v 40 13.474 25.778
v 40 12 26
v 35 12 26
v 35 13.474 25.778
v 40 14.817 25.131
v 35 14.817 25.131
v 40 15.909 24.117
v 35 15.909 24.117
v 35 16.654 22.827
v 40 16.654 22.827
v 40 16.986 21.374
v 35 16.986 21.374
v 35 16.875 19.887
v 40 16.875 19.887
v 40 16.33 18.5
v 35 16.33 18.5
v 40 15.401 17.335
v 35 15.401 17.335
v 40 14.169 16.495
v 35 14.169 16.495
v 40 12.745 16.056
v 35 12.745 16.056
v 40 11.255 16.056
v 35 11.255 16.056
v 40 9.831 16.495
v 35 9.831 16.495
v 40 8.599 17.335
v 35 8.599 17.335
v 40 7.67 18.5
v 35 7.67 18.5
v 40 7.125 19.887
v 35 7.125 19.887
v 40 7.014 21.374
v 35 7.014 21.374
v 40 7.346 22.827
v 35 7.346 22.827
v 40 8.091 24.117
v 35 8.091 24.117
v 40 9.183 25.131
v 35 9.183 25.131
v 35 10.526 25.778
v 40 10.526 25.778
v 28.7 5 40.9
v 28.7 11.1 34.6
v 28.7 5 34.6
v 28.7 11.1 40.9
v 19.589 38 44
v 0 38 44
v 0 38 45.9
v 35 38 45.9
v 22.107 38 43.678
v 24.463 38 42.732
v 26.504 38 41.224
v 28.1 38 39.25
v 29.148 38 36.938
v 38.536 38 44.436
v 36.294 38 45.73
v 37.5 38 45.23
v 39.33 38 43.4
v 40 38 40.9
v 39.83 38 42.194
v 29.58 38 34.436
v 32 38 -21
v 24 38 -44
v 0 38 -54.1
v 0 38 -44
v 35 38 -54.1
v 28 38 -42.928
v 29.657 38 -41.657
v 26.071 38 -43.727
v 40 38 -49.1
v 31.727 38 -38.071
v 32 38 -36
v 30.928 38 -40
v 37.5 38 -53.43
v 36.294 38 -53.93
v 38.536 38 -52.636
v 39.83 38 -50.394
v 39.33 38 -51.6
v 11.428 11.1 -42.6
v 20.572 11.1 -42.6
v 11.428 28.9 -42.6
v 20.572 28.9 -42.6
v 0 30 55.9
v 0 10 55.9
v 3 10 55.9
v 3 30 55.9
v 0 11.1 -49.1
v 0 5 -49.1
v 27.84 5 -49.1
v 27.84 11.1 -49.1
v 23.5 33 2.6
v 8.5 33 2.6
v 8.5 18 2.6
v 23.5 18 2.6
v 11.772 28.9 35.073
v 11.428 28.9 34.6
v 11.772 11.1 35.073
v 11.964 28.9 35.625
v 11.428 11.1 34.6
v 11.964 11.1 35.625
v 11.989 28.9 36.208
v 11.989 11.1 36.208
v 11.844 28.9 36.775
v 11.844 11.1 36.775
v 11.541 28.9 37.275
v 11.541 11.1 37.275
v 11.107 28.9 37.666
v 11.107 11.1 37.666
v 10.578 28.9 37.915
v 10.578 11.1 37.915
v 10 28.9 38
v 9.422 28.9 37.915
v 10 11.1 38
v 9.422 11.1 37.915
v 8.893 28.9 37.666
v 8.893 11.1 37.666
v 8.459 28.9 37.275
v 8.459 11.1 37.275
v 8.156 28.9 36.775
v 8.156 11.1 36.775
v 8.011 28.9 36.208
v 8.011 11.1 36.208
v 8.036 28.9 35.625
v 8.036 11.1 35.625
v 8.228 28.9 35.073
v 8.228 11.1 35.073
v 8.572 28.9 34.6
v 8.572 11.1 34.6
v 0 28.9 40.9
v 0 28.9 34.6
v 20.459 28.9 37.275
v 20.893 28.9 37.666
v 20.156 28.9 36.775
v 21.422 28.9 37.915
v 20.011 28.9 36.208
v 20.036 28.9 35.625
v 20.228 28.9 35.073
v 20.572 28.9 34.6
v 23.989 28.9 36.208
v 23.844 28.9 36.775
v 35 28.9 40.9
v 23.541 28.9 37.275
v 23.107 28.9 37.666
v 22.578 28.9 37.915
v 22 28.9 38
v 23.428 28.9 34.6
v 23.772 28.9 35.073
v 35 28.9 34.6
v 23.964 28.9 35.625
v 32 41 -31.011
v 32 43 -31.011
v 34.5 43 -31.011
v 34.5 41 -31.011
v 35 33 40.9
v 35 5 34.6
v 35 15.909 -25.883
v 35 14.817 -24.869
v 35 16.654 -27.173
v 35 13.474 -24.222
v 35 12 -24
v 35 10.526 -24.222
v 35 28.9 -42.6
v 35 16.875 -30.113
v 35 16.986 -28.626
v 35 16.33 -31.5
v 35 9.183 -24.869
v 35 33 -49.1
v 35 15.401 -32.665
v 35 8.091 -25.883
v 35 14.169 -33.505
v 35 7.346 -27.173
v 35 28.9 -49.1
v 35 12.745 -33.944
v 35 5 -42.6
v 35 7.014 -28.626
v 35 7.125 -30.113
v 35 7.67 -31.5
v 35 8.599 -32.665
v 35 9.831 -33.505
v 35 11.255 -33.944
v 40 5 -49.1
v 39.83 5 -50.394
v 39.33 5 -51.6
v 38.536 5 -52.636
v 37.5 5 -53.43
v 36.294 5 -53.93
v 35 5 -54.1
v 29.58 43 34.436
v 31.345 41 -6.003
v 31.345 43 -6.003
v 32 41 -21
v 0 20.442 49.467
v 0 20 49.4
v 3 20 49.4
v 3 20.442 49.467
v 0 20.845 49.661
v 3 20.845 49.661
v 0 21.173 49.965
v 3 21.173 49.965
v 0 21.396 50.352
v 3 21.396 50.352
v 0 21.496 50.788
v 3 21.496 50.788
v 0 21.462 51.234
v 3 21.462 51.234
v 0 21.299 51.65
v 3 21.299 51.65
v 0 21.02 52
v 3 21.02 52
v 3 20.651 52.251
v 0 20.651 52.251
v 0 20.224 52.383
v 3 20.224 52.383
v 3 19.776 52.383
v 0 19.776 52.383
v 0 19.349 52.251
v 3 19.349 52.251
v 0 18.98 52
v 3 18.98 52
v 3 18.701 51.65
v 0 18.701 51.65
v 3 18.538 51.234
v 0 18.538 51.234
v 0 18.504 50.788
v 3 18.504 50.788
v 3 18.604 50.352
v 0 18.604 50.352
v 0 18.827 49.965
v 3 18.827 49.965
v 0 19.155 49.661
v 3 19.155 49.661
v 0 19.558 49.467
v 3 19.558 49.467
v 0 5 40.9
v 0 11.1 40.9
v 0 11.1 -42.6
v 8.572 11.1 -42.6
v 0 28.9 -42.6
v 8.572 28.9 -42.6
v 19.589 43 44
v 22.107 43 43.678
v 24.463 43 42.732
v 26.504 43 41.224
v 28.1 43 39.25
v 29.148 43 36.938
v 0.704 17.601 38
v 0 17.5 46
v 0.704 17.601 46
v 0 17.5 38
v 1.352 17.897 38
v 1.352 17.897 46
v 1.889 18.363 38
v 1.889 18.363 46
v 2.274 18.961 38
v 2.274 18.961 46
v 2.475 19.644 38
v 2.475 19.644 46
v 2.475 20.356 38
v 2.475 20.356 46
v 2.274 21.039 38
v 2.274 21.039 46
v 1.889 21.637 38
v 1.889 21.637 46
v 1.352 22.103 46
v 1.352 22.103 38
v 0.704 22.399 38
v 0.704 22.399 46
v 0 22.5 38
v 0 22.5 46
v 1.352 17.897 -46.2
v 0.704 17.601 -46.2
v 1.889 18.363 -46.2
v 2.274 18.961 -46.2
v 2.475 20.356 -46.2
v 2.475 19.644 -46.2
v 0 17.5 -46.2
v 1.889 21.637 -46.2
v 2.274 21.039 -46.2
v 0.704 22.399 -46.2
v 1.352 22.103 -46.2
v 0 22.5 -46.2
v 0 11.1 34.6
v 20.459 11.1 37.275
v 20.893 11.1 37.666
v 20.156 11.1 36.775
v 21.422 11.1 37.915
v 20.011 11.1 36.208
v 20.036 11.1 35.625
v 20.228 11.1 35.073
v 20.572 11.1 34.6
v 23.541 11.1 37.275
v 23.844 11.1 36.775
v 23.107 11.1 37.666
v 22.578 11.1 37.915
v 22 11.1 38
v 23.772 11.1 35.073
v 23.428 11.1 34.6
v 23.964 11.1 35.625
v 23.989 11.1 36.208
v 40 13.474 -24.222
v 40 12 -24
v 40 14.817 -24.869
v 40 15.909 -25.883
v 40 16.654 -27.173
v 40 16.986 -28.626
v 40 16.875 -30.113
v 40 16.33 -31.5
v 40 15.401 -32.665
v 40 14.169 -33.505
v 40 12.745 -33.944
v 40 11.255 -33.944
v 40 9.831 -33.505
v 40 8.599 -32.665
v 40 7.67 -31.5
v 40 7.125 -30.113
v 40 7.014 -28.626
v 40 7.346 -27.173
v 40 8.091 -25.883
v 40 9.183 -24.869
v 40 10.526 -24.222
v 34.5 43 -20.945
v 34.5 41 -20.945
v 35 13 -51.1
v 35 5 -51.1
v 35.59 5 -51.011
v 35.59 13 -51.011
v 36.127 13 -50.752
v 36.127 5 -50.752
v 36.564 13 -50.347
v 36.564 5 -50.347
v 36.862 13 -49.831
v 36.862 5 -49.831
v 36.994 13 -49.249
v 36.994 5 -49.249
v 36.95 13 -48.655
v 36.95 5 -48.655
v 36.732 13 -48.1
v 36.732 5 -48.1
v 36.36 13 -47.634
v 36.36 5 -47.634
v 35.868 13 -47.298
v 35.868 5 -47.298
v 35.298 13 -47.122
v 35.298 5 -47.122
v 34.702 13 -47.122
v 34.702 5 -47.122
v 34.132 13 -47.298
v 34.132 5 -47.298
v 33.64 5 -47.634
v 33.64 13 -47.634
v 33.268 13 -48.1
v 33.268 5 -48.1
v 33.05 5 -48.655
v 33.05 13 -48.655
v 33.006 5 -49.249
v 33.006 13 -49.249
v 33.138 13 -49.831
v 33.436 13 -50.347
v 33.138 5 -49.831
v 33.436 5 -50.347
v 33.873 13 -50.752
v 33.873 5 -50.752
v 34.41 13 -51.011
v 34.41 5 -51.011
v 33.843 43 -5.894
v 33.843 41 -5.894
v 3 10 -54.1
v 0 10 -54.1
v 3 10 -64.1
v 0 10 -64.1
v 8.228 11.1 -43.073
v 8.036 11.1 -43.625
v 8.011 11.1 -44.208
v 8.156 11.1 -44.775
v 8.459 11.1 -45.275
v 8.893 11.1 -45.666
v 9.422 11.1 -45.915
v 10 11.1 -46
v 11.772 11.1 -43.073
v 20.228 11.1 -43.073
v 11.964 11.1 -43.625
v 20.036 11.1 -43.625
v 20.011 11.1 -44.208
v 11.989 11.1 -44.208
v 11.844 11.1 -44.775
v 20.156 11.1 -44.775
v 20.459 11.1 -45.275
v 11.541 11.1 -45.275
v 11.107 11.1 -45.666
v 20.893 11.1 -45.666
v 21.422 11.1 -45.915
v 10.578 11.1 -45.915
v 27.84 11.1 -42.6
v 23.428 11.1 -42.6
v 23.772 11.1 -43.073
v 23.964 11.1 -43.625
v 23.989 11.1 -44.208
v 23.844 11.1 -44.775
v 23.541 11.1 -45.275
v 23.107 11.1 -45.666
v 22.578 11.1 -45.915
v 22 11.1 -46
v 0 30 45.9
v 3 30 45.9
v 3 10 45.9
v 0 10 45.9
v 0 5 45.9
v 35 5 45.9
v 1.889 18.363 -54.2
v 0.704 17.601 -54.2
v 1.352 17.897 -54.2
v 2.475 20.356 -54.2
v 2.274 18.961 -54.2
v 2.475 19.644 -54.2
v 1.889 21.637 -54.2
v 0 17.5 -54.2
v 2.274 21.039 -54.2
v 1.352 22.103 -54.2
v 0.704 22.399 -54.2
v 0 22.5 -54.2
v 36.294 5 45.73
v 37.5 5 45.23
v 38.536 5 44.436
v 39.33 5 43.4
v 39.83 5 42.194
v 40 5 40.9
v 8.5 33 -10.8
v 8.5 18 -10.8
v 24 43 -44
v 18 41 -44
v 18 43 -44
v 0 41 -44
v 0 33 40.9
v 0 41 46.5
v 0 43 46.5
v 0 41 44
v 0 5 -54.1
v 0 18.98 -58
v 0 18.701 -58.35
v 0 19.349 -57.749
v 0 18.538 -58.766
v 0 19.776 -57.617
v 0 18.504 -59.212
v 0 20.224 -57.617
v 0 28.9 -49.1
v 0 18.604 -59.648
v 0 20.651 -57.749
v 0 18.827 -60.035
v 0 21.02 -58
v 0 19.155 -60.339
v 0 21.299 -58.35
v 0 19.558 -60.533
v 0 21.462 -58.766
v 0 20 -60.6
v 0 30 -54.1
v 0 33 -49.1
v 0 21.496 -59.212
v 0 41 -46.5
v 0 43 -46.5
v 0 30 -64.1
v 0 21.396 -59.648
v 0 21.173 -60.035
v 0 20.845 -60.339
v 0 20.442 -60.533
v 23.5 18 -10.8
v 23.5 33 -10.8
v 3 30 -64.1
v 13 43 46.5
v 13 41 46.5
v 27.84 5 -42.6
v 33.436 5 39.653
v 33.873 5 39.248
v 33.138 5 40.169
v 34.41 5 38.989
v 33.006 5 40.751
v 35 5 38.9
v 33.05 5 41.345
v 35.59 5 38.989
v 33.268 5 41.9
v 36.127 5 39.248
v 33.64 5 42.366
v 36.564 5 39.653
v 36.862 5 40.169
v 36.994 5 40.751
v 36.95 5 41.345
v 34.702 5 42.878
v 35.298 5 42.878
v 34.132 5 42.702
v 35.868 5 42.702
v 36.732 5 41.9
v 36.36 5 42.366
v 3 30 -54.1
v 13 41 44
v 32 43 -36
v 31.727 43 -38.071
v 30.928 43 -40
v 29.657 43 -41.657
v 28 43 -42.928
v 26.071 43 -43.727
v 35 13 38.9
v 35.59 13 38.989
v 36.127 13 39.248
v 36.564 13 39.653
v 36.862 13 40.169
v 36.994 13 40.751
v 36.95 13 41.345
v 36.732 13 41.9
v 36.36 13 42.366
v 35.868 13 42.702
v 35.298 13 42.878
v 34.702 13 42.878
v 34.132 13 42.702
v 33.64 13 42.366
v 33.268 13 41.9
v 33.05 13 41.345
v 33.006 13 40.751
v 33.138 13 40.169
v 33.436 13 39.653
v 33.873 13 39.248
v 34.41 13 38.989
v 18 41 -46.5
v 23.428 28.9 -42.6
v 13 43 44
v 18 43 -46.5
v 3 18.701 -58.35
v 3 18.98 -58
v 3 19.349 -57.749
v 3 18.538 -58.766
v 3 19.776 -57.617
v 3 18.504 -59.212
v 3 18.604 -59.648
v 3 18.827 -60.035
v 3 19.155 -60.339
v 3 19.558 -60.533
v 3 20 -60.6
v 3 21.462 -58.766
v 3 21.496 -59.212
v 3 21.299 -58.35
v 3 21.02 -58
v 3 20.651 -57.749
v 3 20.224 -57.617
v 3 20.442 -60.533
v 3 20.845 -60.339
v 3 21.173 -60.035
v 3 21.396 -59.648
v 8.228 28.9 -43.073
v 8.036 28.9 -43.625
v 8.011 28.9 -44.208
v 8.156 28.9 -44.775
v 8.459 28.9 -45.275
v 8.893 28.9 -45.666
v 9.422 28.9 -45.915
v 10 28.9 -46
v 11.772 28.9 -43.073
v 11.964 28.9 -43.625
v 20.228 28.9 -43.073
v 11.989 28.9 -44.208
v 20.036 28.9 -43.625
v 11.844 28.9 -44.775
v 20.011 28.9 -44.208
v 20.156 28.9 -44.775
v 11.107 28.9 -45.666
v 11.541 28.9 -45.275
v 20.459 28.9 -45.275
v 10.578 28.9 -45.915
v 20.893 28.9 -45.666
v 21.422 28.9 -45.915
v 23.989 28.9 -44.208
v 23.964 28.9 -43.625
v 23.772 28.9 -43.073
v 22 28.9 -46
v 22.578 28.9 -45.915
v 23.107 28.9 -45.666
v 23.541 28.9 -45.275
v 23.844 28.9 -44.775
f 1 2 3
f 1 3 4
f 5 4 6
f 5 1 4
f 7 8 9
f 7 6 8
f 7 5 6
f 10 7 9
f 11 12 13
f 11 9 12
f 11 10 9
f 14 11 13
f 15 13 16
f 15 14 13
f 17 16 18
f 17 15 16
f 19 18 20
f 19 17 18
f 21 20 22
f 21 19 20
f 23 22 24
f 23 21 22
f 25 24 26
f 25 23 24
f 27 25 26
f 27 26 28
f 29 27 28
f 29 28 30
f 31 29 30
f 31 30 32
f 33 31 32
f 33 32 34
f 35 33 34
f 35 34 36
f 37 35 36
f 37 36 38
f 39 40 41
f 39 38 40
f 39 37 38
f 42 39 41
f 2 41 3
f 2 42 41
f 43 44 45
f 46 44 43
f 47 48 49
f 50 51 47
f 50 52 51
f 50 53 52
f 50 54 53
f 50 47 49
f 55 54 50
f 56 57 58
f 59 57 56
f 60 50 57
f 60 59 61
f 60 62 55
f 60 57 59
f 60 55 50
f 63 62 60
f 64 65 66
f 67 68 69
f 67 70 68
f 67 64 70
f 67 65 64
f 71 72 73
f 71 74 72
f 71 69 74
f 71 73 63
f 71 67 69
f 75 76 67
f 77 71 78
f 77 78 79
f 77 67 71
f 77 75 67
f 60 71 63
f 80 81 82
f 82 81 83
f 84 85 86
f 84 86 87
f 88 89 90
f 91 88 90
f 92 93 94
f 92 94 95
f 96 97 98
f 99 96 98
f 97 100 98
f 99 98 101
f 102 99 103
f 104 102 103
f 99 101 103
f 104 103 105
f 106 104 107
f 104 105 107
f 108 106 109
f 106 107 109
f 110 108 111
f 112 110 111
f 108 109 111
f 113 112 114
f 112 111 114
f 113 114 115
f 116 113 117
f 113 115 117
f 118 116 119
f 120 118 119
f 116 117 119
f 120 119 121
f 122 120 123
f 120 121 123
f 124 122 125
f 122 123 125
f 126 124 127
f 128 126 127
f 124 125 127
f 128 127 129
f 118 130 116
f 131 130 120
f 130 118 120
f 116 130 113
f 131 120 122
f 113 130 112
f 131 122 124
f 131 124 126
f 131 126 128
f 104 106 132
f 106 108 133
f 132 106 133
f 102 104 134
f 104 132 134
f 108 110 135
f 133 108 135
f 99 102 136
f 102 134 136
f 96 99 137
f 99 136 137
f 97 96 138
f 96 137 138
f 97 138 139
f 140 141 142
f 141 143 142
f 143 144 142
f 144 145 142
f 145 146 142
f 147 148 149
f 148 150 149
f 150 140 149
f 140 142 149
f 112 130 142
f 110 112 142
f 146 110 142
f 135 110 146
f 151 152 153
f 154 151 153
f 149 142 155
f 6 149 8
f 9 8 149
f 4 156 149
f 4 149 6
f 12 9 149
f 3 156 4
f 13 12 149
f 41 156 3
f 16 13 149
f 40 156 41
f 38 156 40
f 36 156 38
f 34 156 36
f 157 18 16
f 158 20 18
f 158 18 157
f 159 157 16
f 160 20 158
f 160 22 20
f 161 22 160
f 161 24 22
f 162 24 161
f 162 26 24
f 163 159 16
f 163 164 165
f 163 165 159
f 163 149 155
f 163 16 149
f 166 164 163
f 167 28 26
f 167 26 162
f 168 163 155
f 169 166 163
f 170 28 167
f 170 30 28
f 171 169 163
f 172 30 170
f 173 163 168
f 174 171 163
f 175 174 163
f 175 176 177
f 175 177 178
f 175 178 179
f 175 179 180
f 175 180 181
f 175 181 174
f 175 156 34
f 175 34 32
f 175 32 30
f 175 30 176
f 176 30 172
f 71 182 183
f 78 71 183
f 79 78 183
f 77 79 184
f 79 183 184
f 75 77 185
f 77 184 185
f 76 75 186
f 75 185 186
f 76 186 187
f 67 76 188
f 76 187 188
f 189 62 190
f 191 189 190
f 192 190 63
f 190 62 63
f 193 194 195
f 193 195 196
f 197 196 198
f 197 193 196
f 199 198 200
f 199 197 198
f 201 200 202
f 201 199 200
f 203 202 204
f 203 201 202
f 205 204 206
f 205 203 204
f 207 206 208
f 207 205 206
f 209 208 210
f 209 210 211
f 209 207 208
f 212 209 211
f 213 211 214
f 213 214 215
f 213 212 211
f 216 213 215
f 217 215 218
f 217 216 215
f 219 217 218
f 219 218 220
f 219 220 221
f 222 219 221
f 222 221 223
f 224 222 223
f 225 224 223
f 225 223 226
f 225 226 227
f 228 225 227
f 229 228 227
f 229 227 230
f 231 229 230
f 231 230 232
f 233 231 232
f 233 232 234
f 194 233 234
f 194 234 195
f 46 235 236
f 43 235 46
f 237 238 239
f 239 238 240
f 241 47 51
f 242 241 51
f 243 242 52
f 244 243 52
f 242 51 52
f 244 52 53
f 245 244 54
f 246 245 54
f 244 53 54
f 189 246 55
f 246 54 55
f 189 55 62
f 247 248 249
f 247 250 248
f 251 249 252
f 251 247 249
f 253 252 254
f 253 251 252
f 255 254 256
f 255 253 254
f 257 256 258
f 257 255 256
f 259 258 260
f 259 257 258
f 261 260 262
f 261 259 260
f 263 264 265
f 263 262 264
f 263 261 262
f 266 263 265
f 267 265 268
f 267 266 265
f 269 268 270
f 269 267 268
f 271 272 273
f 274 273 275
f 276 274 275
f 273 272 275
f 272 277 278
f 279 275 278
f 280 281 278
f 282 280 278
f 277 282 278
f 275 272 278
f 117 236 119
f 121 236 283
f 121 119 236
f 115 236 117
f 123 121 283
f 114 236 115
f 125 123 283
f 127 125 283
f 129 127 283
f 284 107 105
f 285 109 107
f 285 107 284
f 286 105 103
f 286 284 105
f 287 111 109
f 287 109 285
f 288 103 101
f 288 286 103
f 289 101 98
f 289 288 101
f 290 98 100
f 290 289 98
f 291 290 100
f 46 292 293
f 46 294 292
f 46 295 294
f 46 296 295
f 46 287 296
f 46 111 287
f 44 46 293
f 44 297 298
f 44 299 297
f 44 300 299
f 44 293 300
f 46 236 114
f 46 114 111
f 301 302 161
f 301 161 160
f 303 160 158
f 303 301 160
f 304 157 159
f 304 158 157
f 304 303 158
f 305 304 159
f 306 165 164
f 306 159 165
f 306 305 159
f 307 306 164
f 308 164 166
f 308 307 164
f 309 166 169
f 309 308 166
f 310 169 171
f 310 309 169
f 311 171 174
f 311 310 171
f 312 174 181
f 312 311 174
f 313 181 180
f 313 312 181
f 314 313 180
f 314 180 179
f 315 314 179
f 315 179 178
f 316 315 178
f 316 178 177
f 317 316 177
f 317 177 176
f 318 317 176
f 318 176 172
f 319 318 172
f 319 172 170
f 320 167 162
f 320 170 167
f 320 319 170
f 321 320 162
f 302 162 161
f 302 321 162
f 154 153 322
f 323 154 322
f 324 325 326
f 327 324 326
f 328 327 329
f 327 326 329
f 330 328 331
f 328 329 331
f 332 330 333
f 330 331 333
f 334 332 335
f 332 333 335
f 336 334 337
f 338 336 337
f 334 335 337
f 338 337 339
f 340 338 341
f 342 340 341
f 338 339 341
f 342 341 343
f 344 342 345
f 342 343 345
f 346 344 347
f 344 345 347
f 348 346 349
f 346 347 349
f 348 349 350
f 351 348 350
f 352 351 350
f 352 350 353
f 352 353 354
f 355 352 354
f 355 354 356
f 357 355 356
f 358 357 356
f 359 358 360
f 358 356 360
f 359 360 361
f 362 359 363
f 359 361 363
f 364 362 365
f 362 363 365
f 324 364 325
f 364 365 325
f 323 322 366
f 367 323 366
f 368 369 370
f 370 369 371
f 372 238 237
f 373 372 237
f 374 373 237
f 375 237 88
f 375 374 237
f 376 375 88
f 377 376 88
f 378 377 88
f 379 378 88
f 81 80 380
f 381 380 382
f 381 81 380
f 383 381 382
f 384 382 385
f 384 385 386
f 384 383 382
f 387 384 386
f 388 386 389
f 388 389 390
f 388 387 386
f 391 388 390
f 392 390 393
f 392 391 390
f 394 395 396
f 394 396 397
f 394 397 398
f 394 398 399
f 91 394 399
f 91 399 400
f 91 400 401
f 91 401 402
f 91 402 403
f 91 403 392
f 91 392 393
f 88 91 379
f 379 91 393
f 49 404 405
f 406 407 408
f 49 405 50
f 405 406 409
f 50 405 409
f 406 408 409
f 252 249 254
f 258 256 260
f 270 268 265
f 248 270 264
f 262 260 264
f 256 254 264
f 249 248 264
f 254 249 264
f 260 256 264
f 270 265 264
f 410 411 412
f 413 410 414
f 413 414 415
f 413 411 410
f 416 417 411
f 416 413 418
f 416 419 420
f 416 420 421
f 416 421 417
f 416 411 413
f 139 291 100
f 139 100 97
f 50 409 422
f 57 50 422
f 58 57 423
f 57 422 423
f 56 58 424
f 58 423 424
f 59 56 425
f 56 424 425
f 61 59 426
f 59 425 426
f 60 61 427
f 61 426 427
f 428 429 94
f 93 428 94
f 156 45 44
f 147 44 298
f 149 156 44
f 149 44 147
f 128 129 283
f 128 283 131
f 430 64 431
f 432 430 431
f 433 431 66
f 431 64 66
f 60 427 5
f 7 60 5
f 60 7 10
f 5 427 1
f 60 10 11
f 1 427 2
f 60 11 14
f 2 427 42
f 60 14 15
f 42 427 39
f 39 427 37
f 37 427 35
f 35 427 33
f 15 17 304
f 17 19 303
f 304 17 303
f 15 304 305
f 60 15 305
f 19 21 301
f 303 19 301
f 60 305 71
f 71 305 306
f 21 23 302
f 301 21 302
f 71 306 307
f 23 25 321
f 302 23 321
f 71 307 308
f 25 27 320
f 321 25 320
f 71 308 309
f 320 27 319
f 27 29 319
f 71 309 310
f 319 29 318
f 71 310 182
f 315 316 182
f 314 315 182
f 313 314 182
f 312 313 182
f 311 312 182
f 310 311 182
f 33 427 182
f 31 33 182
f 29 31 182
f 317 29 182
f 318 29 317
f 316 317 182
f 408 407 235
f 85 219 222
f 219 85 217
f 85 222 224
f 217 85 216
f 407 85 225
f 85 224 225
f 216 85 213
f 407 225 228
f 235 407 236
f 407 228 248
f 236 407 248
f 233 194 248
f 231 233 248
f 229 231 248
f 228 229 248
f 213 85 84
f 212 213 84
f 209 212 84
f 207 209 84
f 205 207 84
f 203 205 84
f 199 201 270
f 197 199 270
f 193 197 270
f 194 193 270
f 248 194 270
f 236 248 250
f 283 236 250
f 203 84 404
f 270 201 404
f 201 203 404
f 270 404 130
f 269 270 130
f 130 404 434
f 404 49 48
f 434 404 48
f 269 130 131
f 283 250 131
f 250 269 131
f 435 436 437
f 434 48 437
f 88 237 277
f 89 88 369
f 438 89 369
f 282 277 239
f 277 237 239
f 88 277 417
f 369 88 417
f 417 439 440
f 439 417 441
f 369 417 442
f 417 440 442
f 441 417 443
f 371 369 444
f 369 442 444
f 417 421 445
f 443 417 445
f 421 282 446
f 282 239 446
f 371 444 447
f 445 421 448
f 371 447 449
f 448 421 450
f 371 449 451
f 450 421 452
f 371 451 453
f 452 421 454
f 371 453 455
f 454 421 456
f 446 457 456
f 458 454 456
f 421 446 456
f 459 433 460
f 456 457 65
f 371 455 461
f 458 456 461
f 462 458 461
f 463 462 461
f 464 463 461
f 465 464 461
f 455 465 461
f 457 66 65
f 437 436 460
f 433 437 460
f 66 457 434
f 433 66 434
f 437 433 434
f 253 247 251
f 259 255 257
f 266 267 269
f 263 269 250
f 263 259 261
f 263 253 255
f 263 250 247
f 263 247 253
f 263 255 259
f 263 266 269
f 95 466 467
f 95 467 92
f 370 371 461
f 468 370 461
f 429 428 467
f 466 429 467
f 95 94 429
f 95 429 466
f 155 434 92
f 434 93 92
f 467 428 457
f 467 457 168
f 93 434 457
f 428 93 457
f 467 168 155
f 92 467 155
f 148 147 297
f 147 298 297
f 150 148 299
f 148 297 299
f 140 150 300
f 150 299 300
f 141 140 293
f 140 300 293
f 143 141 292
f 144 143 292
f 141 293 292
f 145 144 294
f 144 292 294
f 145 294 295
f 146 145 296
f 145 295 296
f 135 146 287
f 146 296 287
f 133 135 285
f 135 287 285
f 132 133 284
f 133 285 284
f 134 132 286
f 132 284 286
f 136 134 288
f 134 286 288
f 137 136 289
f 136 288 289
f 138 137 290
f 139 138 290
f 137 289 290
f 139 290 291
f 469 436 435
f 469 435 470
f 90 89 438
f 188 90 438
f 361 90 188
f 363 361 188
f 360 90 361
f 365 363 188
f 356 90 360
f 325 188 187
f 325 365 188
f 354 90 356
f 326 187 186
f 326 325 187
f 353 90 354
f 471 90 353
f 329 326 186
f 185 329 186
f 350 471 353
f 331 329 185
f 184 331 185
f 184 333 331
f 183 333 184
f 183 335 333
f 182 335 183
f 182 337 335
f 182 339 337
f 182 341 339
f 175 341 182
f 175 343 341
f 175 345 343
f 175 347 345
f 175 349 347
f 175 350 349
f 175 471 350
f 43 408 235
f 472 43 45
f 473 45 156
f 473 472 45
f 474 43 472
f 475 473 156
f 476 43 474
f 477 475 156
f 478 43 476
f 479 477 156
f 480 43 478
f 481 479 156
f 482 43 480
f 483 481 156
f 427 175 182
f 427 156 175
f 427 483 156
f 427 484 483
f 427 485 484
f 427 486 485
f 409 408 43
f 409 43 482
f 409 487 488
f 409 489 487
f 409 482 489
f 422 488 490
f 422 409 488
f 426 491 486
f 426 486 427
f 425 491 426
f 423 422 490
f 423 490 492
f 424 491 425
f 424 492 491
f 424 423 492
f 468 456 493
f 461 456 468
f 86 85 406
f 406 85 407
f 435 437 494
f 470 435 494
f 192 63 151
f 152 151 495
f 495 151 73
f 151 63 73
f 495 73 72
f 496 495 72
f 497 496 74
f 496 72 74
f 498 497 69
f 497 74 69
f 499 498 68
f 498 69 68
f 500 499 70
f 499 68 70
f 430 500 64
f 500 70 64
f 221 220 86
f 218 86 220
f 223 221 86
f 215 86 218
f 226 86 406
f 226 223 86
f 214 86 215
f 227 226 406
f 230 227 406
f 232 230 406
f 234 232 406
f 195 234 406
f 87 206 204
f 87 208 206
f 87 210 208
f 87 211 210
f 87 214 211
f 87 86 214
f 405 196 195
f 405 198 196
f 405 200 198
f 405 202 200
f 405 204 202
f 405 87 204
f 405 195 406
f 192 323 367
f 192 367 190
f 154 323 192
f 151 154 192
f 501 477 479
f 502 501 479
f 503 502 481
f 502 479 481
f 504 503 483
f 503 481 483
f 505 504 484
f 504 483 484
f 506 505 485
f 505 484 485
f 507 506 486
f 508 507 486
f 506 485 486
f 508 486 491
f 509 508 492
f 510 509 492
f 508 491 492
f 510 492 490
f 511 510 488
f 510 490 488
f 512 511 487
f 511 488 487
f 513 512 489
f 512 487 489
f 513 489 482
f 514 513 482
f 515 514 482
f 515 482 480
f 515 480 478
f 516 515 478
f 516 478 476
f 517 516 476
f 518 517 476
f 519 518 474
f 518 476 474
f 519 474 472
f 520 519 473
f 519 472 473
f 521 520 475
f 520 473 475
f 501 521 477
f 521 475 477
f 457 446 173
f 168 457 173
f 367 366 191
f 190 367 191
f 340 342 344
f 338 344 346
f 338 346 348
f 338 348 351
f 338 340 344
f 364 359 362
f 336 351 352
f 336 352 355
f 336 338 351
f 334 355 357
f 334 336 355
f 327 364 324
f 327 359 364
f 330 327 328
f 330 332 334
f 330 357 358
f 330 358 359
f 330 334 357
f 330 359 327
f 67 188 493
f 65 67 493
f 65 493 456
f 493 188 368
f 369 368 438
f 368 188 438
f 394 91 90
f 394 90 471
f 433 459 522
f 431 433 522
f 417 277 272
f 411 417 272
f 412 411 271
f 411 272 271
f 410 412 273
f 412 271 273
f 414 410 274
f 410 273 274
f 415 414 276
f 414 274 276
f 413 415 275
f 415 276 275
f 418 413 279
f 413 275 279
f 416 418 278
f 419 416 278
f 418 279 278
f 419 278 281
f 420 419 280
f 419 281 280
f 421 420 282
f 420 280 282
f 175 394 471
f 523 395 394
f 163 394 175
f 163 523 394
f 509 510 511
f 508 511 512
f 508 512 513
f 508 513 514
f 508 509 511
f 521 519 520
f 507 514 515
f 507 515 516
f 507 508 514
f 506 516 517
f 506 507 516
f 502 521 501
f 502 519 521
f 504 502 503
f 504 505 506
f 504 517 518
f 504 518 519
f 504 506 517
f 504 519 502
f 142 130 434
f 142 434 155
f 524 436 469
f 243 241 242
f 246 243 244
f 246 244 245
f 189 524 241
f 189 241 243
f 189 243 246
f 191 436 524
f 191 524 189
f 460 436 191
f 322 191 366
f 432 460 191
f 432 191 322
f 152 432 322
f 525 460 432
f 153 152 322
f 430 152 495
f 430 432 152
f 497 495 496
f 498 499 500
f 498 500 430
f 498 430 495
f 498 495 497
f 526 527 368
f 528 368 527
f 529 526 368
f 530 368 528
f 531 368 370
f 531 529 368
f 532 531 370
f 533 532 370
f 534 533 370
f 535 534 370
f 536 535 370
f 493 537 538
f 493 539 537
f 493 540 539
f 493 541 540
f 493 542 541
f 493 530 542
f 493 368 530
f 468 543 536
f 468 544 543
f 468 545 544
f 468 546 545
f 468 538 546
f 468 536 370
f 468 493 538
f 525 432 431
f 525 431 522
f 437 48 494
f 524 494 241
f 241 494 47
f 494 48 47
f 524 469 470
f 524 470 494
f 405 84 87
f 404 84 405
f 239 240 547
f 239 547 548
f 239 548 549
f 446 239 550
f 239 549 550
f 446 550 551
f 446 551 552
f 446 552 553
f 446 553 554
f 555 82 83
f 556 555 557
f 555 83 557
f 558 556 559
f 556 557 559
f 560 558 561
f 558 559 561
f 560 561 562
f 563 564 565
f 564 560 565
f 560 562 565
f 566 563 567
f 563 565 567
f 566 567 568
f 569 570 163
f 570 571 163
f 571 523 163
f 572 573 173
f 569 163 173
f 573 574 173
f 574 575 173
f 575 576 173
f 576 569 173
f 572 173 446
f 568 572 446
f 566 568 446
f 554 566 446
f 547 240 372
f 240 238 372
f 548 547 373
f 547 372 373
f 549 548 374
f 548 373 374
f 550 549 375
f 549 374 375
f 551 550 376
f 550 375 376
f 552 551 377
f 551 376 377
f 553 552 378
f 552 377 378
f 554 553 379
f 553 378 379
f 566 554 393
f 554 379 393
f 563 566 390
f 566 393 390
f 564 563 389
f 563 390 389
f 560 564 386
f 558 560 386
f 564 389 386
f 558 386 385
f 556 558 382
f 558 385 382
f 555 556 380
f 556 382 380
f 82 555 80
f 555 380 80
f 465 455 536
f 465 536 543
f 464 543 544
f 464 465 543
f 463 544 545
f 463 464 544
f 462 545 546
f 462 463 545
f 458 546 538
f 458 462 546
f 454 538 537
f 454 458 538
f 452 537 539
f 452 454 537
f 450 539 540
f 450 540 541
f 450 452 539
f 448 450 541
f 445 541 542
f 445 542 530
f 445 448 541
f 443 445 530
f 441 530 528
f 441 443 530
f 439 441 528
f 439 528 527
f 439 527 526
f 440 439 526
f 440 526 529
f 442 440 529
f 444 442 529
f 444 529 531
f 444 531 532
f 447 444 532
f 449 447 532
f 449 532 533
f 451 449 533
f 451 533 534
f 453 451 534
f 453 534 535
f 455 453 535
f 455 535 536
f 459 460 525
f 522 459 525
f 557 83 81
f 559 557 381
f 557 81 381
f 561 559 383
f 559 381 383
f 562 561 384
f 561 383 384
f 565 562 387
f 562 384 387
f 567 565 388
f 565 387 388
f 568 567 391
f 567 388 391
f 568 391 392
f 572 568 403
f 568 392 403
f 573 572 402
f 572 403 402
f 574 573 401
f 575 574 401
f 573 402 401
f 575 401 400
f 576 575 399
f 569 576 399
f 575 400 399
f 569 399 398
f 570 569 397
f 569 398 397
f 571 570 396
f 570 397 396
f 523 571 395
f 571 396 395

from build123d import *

# Parameters (mm, degrees)
SKETCH8_R                        = 10
BOSS_EXTRUDE6_DEPTH              = 5
BOSS_EXTRUDE7_START              = 5
BOSS_EXTRUDE7_DEPTH              = 5
EXTRUDE_THIN4_DEPTH              = 8
EXTRUDE_THIN4_DEPTH_BACK         = 20
SKETCH2_W                        = 70
SKETCH2_H                        = 90
BOSS_EXTRUDE8_DEPTH              = 5
BOSS_EXTRUDE9_DEPTH              = 5
BOSS_EXTRUDE10_REACH             = 81.849
SKETCH13_W                       = 6.5
SKETCH13_H                       = 17.8
SKETCH13_W_2                     = 6.3
BOSS_EXTRUDE10_DIRECTION_2_REACH = 81.849
SKETCH15_R                       = 2
CUT_EXTRUDE1_DEPTH               = 17.8
SKETCH17_W                       = 36
SKETCH17_H                       = 3
SKETCH17_W_2                     = 26
BOSS_EXTRUDE11_DEPTH             = 2
SKETCH18_W                       = 36
SKETCH18_H                       = 3
SKETCH18_W_2                     = 26
BOSS_EXTRUDE12_DEPTH             = 2
BOSS_EXTRUDE13_DEPTH             = 3
BOSS_EXTRUDE13_DEPTH_BACK        = 3
SKETCH19_W                       = 10
SKETCH19_H                       = 20
SKETCH19_R                       = 1.5
SKETCH21_R                       = 2.5
CUT_EXTRUDE5_DEPTH               = 8
SKETCH23_R                       = 2.5
CUT_EXTRUDE6_DEPTH               = 8
SKETCH24_W                       = 150
SKETCH24_H                       = 150
CUT_EXTRUDE7_DEPTH               = 85.574286873
SKETCH25_W                       = 150
SKETCH25_H                       = 150
CUT_EXTRUDE8_DEPTH               = 87.935665869
SKETCH26_W                       = 7.16
SKETCH26_H                       = 6.5
SKETCH26_W_2                     = 6.3
SKETCH26_H_2                     = 6.3
BOSS_EXTRUDE14_DEPTH             = 6.1
SKETCH27_R                       = 2
CUT_EXTRUDE9_DEPTH               = 8
SKETCH28_W                       = 15
SKETCH28_H                       = 13.4
BOSS_EXTRUDE15_DEPTH             = 15
CUT_EXTRUDE10_DEPTH              = 87.935665869
CUT_EXTRUDE10_DEPTH_BACK         = 87.935665869
SKETCH29_R                       = 5


with BuildPart() as part:
    # Sketch8 → Boss-Extrude6 (new body)
    with BuildSketch(Plane(origin=(0, 0, 0), x_dir=(-1, 0, 0), z_dir=(0, 1, 0))):
        with BuildLine():
            Line((32, -36), (32, -21))
            Line((32, -21), (29.579603504, 34.436193874))
            ThreePointArc((29.579603504, 34.436193874), (26.504251846, 41.223639621), (19.589121288, 44))
            Line((19.589121288, 44), (-19.589121288, 44))
            ThreePointArc((-19.589121288, 44), (-26.504251846, 41.223639621), (-29.579603504, 34.436193874))
            Line((-29.579603504, 34.436193874), (-32, -21))
            Line((-32, -21), (-32, -36))
            ThreePointArc((-32, -36), (-29.656854249, -41.656854249), (-24, -44))
            Line((-24, -44), (24, -44))
            ThreePointArc((24, -44), (29.656854249, -41.656854249), (32, -36))
        make_face()
        with Locations(Location((15.9, 11.8, 0), (0, 0, 90))):
            Circle(SKETCH8_R, mode=Mode.SUBTRACT)
        with Locations(Location((-15.9, 11.8, 0), (0, 0, 90))):
            Circle(SKETCH8_R, mode=Mode.SUBTRACT)
        with Locations(Location((15.9, -20, 0), (0, 0, 90))):
            Circle(SKETCH8_R, mode=Mode.SUBTRACT)
        with Locations(Location((-15.9, -20, 0), (0, 0, 90))):
            Circle(SKETCH8_R, mode=Mode.SUBTRACT)
    extrude(amount=-BOSS_EXTRUDE6_DEPTH)

    # Sketch1 → Boss-Extrude7 (add)
    # profile 1 of 2: a face of its own
    with BuildSketch(Plane(origin=(0, 0, 0), x_dir=(1, 0, 0), z_dir=(0, 1, 0)).offset(BOSS_EXTRUDE7_START)):
        with BuildLine():
            Line((-35, 54.1), (35, 54.1))
            ThreePointArc((35, 54.1), (38.535533906, 52.635533906), (40, 49.1))
            Line((40, 49.1), (40, -40.9))
            ThreePointArc((40, -40.9), (38.535533906, -44.435533906), (35, -45.9))
            Line((35, -45.9), (-35, -45.9))
            ThreePointArc((-35, -45.9), (-38.535533906, -44.435533906), (-40, -40.9))
            Line((-40, -40.9), (-40, 49.1))
            ThreePointArc((-40, 49.1), (-38.535533906, 52.635533906), (-35, 54.1))
        make_face()
        with BuildLine():
            ThreePointArc((32, 36), (29.656854249, 41.656854249), (24, 44))
            Line((24, 44), (-24, 44))
            ThreePointArc((-24, 44), (-29.656854249, 41.656854249), (-32, 36))
            Line((-32, 36), (-32, 21))
            Line((-32, 21), (-29.579603504, -34.436193874))
            ThreePointArc((-29.579603504, -34.436193874), (-26.504251846, -41.223639621), (-19.589121288, -44))
            Line((-19.589121288, -44), (19.589121288, -44))
            ThreePointArc((19.589121288, -44), (26.504251846, -41.223639621), (29.579603504, -34.436193874))
            Line((29.579603504, -34.436193874), (32, 21))
            Line((32, 21), (32, 36))
        make_face(mode=Mode.SUBTRACT)
    # profile 2 of 2: a face of its own
    with BuildSketch(Plane(origin=(0, 0, 0), x_dir=(1, 0, 0), z_dir=(0, 1, 0)).offset(BOSS_EXTRUDE7_START)):
        with BuildLine():
            Line((32, 36), (32, 21))
            Line((32, 21), (29.579603504, -34.436193874))
            ThreePointArc((29.579603504, -34.436193874), (26.504251846, -41.223639621), (19.589121288, -44))
            Line((19.589121288, -44), (-19.589121288, -44))
            ThreePointArc((-19.589121288, -44), (-26.504251846, -41.223639621), (-29.579603504, -34.436193874))
            Line((-29.579603504, -34.436193874), (-32, 21))
            Line((-32, 21), (-32, 36))
            ThreePointArc((-32, 36), (-29.656854249, 41.656854249), (-24, 44))
            Line((-24, 44), (24, 44))
            ThreePointArc((24, 44), (29.656854249, 41.656854249), (32, 36))
        make_face()
        with BuildLine():
            ThreePointArc((-24, 41), (-27.535533906, 39.535533906), (-29, 36))
            Line((-29, 36), (-29, 21.065460233))
            Line((-29, 21.065460233), (-26.582458839, -34.305335712))
            ThreePointArc((-26.582458839, -34.305335712), (-24.429712679, -39.056547734), (-19.589121288, -41))
            Line((-19.589121288, -41), (19.589121288, -41))
            ThreePointArc((19.589121288, -41), (24.429712679, -39.056547734), (26.582458839, -34.305335712))
            Line((26.582458839, -34.305335712), (29, 21.065460233))
            Line((29, 21.065460233), (29, 36))
            ThreePointArc((29, 36), (27.535533906, 39.535533906), (24, 41))
            Line((24, 41), (-24, 41))
        make_face(mode=Mode.SUBTRACT)
    extrude(amount=-BOSS_EXTRUDE7_DEPTH)

    # Sketch17 → Boss-Extrude11 (add)
    with BuildSketch(Plane(origin=(0, -5, 0), x_dir=(1, 0, 0), z_dir=(0, 1, 0))):
        with Locations((0, 45)):
            Rectangle(SKETCH17_W, SKETCH17_H)
        with Locations((0, -45)):
            Rectangle(SKETCH17_W_2, SKETCH17_H)
        Polygon((-31.5, 21.010910039), (-30.84570919, 6.025186715), (-33.842853854, 5.894328553), (-34.5, 20.945449806), (-34.5, 31.010910039), (-31.5, 31.010910039), align=None)
        Polygon((31.5, 21.010910039), (31.5, 31.010910039), (34.5, 31.010910039), (34.5, 20.945449806), (33.842853854, 5.894328553), (30.84570919, 6.025186715), align=None)
    extrude(amount=BOSS_EXTRUDE11_DEPTH)

    # Sketch24 → Cut-Extrude7 (cut, through all)
    with BuildSketch(Plane(origin=(0, 5, 0), x_dir=(1, 0, 0), z_dir=(0, 1, 0))):
        Rectangle(SKETCH24_W, SKETCH24_H)
    extrude(amount=-CUT_EXTRUDE7_DEPTH, mode=Mode.SUBTRACT)


with BuildPart() as body_2:
    # Sketch2 → Extrude-Thin4 (new, two sides: drawn at the far end of the back side and taken through both)
    with BuildSketch(Plane(origin=(0, 25, 0), x_dir=(1, 0, 0), z_dir=(0, 1, 0)).offset(-EXTRUDE_THIN4_DEPTH_BACK)):
        with BuildLine():
            Line((-40, 49.1), (-40, -40.9))
            ThreePointArc((-40, -40.9), (-38.535533906, -44.435533906), (-35, -45.9))
            Line((-35, -45.9), (35, -45.9))
            ThreePointArc((35, -45.9), (38.535533906, -44.435533906), (40, -40.9))
            Line((40, -40.9), (40, 49.1))
            ThreePointArc((40, 49.1), (38.535533906, 52.635533906), (35, 54.1))
            Line((35, 54.1), (-35, 54.1))
            ThreePointArc((-35, 54.1), (-38.535533906, 52.635533906), (-40, 49.1))
        make_face()
        with Locations((0, 4.1)):
            Rectangle(SKETCH2_W, SKETCH2_H, mode=Mode.SUBTRACT)
    extrude(amount=EXTRUDE_THIN4_DEPTH + EXTRUDE_THIN4_DEPTH_BACK)

    # Sketch13 → Boss-Extrude10 (add, up to next)
    with BuildSketch(Plane(origin=(0, 0, 0), x_dir=(0, 0, -1), z_dir=(1, 0, 0)), mode=Mode.PRIVATE) as boss_extrude10_sk1:
        with Locations((45.85, 20)):
            Rectangle(SKETCH13_W, SKETCH13_H)
    boss_extrude10_tool1 = extrude(boss_extrude10_sk1.sketch, amount=BOSS_EXTRUDE10_REACH, mode=Mode.PRIVATE) - body_2.part
    # Sketch13 → Boss-Extrude10 (add, up to next)
    with BuildSketch(Plane(origin=(0, 0, 0), x_dir=(0, 0, -1), z_dir=(1, 0, 0)), mode=Mode.PRIVATE) as boss_extrude10_sk2:
        with Locations((-37.75, 20)):
            Rectangle(SKETCH13_W_2, SKETCH13_H)
    boss_extrude10_tool2 = extrude(boss_extrude10_sk2.sketch, amount=BOSS_EXTRUDE10_REACH, mode=Mode.PRIVATE) - body_2.part
    add(boss_extrude10_tool1.solids().sort_by_distance((0, 20, -45.85))[0])
    add(boss_extrude10_tool2.solids().sort_by_distance((0, 20, 37.75))[0])

    # Sketch13 → Boss-Extrude10 direction 2 (add, up to next)
    with BuildSketch(Plane(origin=(0, 0, 0), x_dir=(0, 0, -1), z_dir=(1, 0, 0)), mode=Mode.PRIVATE) as boss_extrude10_direction_2_sk1:
        with Locations((45.85, 20)):
            Rectangle(SKETCH13_W, SKETCH13_H)
    boss_extrude10_direction_2_tool1 = extrude(boss_extrude10_direction_2_sk1.sketch, amount=-BOSS_EXTRUDE10_DIRECTION_2_REACH, mode=Mode.PRIVATE) - body_2.part
    # Sketch13 → Boss-Extrude10 direction 2 (add, up to next)
    with BuildSketch(Plane(origin=(0, 0, 0), x_dir=(0, 0, -1), z_dir=(1, 0, 0)), mode=Mode.PRIVATE) as boss_extrude10_direction_2_sk2:
        with Locations((-37.75, 20)):
            Rectangle(SKETCH13_W_2, SKETCH13_H)
    boss_extrude10_direction_2_tool2 = extrude(boss_extrude10_direction_2_sk2.sketch, amount=-BOSS_EXTRUDE10_DIRECTION_2_REACH, mode=Mode.PRIVATE) - body_2.part
    add(boss_extrude10_direction_2_tool1.solids().sort_by_distance((0, 20, -45.85))[0])
    add(boss_extrude10_direction_2_tool2.solids().sort_by_distance((0, 20, 37.75))[0])

    # Sketch15 → Cut-Extrude1 (cut)
    with BuildSketch(Plane.XZ.offset(-11.1)):
        with Locations((-22, -44)):
            Circle(SKETCH15_R)
        with Locations((-10, -44)):
            Circle(SKETCH15_R)
        with Locations((-22, 36)):
            Circle(SKETCH15_R)
        with Locations((-10, 36)):
            Circle(SKETCH15_R)
        with Locations((10, 36)):
            Circle(SKETCH15_R)
        with Locations((22, 36)):
            Circle(SKETCH15_R)
        with Locations((10, -44)):
            Circle(SKETCH15_R)
        with Locations((22, -44)):
            Circle(SKETCH15_R)
    extrude(amount=-CUT_EXTRUDE1_DEPTH, mode=Mode.SUBTRACT)

    # Sketch19 → Boss-Extrude13 (add, two sides: drawn at the far end of the back side and taken through both)
    # profile 1 of 2: a face of its own
    with BuildSketch(Plane(origin=(0, 0, 0), x_dir=(0, 0, -1), z_dir=(1, 0, 0)).offset(-BOSS_EXTRUDE13_DEPTH_BACK)):
        with Locations((-50.9, 20)):
            Rectangle(SKETCH19_W, SKETCH19_H)
        with Locations((-50.9, 20)):
            Circle(SKETCH19_R, mode=Mode.SUBTRACT)
    # profile 2 of 2: a face of its own
    with BuildSketch(Plane(origin=(0, 0, 0), x_dir=(0, 0, -1), z_dir=(1, 0, 0)).offset(-BOSS_EXTRUDE13_DEPTH_BACK)):
        with Locations((59.1, 20)):
            Rectangle(SKETCH19_W, SKETCH19_H)
        with Locations((59.1, 20)):
            Circle(SKETCH19_R, mode=Mode.SUBTRACT)
    extrude(amount=BOSS_EXTRUDE13_DEPTH + BOSS_EXTRUDE13_DEPTH_BACK)

    # Sketch21 → Cut-Extrude5 (cut)
    with BuildSketch(Plane.XY.offset(38)):
        with Locations((0, 20)):
            Circle(SKETCH21_R)
    extrude(amount=CUT_EXTRUDE5_DEPTH, mode=Mode.SUBTRACT)

    # Sketch23 → Cut-Extrude6 (cut)
    with BuildSketch(Plane.XY.offset(-46.2)):
        with Locations((0, 20)):
            Circle(SKETCH23_R)
    extrude(amount=-CUT_EXTRUDE6_DEPTH, mode=Mode.SUBTRACT)


with BuildPart() as body_3:
    # Sketch10 → Boss-Extrude8 (new body)
    with BuildSketch(Plane(origin=(0, 38, 0), x_dir=(1, 0, 0), z_dir=(0, 1, 0))):
        with BuildLine():
            Line((-32, 36), (-32, 21))
            Line((-32, 21), (-29.579603504, -34.436193874))
            ThreePointArc((-29.579603504, -34.436193874), (-26.504251846, -41.223639621), (-19.589121288, -44))
            Line((-19.589121288, -44), (19.589121288, -44))
            ThreePointArc((19.589121288, -44), (26.504251846, -41.223639621), (29.579603504, -34.436193874))
            Line((29.579603504, -34.436193874), (32, 21))
            Line((32, 21), (32, 36))
            ThreePointArc((32, 36), (29.656854249, 41.656854249), (24, 44))
            Line((24, 44), (-24, 44))
            ThreePointArc((-24, 44), (-29.656854249, 41.656854249), (-32, 36))
        make_face()
    extrude(amount=BOSS_EXTRUDE8_DEPTH)

    # Sketch11 → Boss-Extrude9 (add)
    with BuildSketch(Plane(origin=(0, 38, 0), x_dir=(1, 0, 0), z_dir=(0, 1, 0))):
        with BuildLine():
            Line((-35, -45.9), (35, -45.9))
            ThreePointArc((35, -45.9), (38.535533906, -44.435533906), (40, -40.9))
            Line((40, -40.9), (40, 49.1))
            ThreePointArc((40, 49.1), (38.535533906, 52.635533906), (35, 54.1))
            Line((35, 54.1), (-35, 54.1))
            ThreePointArc((-35, 54.1), (-38.535533906, 52.635533906), (-40, 49.1))
            Line((-40, 49.1), (-40, -40.9))
            ThreePointArc((-40, -40.9), (-38.535533906, -44.435533906), (-35, -45.9))
        make_face()
    extrude(amount=-BOSS_EXTRUDE9_DEPTH)

    # Sketch18 → Boss-Extrude12 (add)
    with BuildSketch(Plane(origin=(0, 43, 0), x_dir=(1, 0, 0), z_dir=(0, 1, 0))):
        with Locations((0, 45)):
            Rectangle(SKETCH18_W, SKETCH18_H)
        with Locations((0, -45)):
            Rectangle(SKETCH18_W_2, SKETCH18_H)
        Polygon((-31.5, 21.010910039), (-30.84570919, 6.025186715), (-33.842853854, 5.894328553), (-34.5, 20.945449806), (-34.5, 31.010910039), (-31.5, 31.010910039), align=None)
        Polygon((31.5, 21.010910039), (31.5, 31.010910039), (34.5, 31.010910039), (34.5, 20.945449806), (33.842853854, 5.894328553), (30.84570919, 6.025186715), align=None)
    extrude(amount=-BOSS_EXTRUDE12_DEPTH)


with BuildPart() as cut_extrude8_tool:
    # Sketch25 → Cut-Extrude8 (new, through all)
    with BuildSketch(Plane(origin=(0, 0, 0), x_dir=(0, 0, -1), z_dir=(1, 0, 0))):
        Rectangle(SKETCH25_W, SKETCH25_H)
    extrude(amount=-CUT_EXTRUDE8_DEPTH)


with BuildPart() as body_2_1:
    add(body_2.part)

    # Cut-Extrude8: cut by cut_extrude8_tool
    add(cut_extrude8_tool.part, mode=Mode.SUBTRACT)

    # Sketch26 → Boss-Extrude14 (add)
    with BuildSketch(Plane.XZ.offset(-11.1)):
        with Locations((31.42, -45.85)):
            Rectangle(SKETCH26_W, SKETCH26_H)
        with Locations((31.85, 37.75)):
            Rectangle(SKETCH26_W_2, SKETCH26_H_2)
    extrude(amount=BOSS_EXTRUDE14_DEPTH)

    # Sketch27 → Cut-Extrude9 (cut)
    with BuildSketch(Plane.XZ.offset(-5)):
        with Locations(Location((35, 40.9, 0), (0, 0, 270))):
            Circle(SKETCH27_R)
        with Locations(Location((35, -49.1, 0), (0, 0, 270))):
            Circle(SKETCH27_R)
    extrude(amount=-CUT_EXTRUDE9_DEPTH, mode=Mode.SUBTRACT)


with BuildPart() as body_3_1:
    add(body_3.part)

    # Cut-Extrude8: cut by cut_extrude8_tool
    add(cut_extrude8_tool.part, mode=Mode.SUBTRACT)


    add(body_2_1.part)  # Boss-Extrude15 merges body 2
    # Sketch28 → Boss-Extrude15 (add)
    with BuildSketch(Plane.XZ.offset(-33)):
        with Locations((16, -4.1)):
            Rectangle(SKETCH28_W, SKETCH28_H)
    extrude(amount=BOSS_EXTRUDE15_DEPTH)

    # Sketch29 → Cut-Extrude10 (cut, two sides: drawn at the far end of the back side and taken through both)
    with BuildSketch(Plane.ZY.offset(-CUT_EXTRUDE10_DEPTH_BACK)):
        with Locations((-29, 12)):
            Circle(SKETCH29_R)
        with Locations((21, 12)):
            Circle(SKETCH29_R)
    extrude(amount=CUT_EXTRUDE10_DEPTH + CUT_EXTRUDE10_DEPTH_BACK, mode=Mode.SUBTRACT)


solid = body_3_1.part
